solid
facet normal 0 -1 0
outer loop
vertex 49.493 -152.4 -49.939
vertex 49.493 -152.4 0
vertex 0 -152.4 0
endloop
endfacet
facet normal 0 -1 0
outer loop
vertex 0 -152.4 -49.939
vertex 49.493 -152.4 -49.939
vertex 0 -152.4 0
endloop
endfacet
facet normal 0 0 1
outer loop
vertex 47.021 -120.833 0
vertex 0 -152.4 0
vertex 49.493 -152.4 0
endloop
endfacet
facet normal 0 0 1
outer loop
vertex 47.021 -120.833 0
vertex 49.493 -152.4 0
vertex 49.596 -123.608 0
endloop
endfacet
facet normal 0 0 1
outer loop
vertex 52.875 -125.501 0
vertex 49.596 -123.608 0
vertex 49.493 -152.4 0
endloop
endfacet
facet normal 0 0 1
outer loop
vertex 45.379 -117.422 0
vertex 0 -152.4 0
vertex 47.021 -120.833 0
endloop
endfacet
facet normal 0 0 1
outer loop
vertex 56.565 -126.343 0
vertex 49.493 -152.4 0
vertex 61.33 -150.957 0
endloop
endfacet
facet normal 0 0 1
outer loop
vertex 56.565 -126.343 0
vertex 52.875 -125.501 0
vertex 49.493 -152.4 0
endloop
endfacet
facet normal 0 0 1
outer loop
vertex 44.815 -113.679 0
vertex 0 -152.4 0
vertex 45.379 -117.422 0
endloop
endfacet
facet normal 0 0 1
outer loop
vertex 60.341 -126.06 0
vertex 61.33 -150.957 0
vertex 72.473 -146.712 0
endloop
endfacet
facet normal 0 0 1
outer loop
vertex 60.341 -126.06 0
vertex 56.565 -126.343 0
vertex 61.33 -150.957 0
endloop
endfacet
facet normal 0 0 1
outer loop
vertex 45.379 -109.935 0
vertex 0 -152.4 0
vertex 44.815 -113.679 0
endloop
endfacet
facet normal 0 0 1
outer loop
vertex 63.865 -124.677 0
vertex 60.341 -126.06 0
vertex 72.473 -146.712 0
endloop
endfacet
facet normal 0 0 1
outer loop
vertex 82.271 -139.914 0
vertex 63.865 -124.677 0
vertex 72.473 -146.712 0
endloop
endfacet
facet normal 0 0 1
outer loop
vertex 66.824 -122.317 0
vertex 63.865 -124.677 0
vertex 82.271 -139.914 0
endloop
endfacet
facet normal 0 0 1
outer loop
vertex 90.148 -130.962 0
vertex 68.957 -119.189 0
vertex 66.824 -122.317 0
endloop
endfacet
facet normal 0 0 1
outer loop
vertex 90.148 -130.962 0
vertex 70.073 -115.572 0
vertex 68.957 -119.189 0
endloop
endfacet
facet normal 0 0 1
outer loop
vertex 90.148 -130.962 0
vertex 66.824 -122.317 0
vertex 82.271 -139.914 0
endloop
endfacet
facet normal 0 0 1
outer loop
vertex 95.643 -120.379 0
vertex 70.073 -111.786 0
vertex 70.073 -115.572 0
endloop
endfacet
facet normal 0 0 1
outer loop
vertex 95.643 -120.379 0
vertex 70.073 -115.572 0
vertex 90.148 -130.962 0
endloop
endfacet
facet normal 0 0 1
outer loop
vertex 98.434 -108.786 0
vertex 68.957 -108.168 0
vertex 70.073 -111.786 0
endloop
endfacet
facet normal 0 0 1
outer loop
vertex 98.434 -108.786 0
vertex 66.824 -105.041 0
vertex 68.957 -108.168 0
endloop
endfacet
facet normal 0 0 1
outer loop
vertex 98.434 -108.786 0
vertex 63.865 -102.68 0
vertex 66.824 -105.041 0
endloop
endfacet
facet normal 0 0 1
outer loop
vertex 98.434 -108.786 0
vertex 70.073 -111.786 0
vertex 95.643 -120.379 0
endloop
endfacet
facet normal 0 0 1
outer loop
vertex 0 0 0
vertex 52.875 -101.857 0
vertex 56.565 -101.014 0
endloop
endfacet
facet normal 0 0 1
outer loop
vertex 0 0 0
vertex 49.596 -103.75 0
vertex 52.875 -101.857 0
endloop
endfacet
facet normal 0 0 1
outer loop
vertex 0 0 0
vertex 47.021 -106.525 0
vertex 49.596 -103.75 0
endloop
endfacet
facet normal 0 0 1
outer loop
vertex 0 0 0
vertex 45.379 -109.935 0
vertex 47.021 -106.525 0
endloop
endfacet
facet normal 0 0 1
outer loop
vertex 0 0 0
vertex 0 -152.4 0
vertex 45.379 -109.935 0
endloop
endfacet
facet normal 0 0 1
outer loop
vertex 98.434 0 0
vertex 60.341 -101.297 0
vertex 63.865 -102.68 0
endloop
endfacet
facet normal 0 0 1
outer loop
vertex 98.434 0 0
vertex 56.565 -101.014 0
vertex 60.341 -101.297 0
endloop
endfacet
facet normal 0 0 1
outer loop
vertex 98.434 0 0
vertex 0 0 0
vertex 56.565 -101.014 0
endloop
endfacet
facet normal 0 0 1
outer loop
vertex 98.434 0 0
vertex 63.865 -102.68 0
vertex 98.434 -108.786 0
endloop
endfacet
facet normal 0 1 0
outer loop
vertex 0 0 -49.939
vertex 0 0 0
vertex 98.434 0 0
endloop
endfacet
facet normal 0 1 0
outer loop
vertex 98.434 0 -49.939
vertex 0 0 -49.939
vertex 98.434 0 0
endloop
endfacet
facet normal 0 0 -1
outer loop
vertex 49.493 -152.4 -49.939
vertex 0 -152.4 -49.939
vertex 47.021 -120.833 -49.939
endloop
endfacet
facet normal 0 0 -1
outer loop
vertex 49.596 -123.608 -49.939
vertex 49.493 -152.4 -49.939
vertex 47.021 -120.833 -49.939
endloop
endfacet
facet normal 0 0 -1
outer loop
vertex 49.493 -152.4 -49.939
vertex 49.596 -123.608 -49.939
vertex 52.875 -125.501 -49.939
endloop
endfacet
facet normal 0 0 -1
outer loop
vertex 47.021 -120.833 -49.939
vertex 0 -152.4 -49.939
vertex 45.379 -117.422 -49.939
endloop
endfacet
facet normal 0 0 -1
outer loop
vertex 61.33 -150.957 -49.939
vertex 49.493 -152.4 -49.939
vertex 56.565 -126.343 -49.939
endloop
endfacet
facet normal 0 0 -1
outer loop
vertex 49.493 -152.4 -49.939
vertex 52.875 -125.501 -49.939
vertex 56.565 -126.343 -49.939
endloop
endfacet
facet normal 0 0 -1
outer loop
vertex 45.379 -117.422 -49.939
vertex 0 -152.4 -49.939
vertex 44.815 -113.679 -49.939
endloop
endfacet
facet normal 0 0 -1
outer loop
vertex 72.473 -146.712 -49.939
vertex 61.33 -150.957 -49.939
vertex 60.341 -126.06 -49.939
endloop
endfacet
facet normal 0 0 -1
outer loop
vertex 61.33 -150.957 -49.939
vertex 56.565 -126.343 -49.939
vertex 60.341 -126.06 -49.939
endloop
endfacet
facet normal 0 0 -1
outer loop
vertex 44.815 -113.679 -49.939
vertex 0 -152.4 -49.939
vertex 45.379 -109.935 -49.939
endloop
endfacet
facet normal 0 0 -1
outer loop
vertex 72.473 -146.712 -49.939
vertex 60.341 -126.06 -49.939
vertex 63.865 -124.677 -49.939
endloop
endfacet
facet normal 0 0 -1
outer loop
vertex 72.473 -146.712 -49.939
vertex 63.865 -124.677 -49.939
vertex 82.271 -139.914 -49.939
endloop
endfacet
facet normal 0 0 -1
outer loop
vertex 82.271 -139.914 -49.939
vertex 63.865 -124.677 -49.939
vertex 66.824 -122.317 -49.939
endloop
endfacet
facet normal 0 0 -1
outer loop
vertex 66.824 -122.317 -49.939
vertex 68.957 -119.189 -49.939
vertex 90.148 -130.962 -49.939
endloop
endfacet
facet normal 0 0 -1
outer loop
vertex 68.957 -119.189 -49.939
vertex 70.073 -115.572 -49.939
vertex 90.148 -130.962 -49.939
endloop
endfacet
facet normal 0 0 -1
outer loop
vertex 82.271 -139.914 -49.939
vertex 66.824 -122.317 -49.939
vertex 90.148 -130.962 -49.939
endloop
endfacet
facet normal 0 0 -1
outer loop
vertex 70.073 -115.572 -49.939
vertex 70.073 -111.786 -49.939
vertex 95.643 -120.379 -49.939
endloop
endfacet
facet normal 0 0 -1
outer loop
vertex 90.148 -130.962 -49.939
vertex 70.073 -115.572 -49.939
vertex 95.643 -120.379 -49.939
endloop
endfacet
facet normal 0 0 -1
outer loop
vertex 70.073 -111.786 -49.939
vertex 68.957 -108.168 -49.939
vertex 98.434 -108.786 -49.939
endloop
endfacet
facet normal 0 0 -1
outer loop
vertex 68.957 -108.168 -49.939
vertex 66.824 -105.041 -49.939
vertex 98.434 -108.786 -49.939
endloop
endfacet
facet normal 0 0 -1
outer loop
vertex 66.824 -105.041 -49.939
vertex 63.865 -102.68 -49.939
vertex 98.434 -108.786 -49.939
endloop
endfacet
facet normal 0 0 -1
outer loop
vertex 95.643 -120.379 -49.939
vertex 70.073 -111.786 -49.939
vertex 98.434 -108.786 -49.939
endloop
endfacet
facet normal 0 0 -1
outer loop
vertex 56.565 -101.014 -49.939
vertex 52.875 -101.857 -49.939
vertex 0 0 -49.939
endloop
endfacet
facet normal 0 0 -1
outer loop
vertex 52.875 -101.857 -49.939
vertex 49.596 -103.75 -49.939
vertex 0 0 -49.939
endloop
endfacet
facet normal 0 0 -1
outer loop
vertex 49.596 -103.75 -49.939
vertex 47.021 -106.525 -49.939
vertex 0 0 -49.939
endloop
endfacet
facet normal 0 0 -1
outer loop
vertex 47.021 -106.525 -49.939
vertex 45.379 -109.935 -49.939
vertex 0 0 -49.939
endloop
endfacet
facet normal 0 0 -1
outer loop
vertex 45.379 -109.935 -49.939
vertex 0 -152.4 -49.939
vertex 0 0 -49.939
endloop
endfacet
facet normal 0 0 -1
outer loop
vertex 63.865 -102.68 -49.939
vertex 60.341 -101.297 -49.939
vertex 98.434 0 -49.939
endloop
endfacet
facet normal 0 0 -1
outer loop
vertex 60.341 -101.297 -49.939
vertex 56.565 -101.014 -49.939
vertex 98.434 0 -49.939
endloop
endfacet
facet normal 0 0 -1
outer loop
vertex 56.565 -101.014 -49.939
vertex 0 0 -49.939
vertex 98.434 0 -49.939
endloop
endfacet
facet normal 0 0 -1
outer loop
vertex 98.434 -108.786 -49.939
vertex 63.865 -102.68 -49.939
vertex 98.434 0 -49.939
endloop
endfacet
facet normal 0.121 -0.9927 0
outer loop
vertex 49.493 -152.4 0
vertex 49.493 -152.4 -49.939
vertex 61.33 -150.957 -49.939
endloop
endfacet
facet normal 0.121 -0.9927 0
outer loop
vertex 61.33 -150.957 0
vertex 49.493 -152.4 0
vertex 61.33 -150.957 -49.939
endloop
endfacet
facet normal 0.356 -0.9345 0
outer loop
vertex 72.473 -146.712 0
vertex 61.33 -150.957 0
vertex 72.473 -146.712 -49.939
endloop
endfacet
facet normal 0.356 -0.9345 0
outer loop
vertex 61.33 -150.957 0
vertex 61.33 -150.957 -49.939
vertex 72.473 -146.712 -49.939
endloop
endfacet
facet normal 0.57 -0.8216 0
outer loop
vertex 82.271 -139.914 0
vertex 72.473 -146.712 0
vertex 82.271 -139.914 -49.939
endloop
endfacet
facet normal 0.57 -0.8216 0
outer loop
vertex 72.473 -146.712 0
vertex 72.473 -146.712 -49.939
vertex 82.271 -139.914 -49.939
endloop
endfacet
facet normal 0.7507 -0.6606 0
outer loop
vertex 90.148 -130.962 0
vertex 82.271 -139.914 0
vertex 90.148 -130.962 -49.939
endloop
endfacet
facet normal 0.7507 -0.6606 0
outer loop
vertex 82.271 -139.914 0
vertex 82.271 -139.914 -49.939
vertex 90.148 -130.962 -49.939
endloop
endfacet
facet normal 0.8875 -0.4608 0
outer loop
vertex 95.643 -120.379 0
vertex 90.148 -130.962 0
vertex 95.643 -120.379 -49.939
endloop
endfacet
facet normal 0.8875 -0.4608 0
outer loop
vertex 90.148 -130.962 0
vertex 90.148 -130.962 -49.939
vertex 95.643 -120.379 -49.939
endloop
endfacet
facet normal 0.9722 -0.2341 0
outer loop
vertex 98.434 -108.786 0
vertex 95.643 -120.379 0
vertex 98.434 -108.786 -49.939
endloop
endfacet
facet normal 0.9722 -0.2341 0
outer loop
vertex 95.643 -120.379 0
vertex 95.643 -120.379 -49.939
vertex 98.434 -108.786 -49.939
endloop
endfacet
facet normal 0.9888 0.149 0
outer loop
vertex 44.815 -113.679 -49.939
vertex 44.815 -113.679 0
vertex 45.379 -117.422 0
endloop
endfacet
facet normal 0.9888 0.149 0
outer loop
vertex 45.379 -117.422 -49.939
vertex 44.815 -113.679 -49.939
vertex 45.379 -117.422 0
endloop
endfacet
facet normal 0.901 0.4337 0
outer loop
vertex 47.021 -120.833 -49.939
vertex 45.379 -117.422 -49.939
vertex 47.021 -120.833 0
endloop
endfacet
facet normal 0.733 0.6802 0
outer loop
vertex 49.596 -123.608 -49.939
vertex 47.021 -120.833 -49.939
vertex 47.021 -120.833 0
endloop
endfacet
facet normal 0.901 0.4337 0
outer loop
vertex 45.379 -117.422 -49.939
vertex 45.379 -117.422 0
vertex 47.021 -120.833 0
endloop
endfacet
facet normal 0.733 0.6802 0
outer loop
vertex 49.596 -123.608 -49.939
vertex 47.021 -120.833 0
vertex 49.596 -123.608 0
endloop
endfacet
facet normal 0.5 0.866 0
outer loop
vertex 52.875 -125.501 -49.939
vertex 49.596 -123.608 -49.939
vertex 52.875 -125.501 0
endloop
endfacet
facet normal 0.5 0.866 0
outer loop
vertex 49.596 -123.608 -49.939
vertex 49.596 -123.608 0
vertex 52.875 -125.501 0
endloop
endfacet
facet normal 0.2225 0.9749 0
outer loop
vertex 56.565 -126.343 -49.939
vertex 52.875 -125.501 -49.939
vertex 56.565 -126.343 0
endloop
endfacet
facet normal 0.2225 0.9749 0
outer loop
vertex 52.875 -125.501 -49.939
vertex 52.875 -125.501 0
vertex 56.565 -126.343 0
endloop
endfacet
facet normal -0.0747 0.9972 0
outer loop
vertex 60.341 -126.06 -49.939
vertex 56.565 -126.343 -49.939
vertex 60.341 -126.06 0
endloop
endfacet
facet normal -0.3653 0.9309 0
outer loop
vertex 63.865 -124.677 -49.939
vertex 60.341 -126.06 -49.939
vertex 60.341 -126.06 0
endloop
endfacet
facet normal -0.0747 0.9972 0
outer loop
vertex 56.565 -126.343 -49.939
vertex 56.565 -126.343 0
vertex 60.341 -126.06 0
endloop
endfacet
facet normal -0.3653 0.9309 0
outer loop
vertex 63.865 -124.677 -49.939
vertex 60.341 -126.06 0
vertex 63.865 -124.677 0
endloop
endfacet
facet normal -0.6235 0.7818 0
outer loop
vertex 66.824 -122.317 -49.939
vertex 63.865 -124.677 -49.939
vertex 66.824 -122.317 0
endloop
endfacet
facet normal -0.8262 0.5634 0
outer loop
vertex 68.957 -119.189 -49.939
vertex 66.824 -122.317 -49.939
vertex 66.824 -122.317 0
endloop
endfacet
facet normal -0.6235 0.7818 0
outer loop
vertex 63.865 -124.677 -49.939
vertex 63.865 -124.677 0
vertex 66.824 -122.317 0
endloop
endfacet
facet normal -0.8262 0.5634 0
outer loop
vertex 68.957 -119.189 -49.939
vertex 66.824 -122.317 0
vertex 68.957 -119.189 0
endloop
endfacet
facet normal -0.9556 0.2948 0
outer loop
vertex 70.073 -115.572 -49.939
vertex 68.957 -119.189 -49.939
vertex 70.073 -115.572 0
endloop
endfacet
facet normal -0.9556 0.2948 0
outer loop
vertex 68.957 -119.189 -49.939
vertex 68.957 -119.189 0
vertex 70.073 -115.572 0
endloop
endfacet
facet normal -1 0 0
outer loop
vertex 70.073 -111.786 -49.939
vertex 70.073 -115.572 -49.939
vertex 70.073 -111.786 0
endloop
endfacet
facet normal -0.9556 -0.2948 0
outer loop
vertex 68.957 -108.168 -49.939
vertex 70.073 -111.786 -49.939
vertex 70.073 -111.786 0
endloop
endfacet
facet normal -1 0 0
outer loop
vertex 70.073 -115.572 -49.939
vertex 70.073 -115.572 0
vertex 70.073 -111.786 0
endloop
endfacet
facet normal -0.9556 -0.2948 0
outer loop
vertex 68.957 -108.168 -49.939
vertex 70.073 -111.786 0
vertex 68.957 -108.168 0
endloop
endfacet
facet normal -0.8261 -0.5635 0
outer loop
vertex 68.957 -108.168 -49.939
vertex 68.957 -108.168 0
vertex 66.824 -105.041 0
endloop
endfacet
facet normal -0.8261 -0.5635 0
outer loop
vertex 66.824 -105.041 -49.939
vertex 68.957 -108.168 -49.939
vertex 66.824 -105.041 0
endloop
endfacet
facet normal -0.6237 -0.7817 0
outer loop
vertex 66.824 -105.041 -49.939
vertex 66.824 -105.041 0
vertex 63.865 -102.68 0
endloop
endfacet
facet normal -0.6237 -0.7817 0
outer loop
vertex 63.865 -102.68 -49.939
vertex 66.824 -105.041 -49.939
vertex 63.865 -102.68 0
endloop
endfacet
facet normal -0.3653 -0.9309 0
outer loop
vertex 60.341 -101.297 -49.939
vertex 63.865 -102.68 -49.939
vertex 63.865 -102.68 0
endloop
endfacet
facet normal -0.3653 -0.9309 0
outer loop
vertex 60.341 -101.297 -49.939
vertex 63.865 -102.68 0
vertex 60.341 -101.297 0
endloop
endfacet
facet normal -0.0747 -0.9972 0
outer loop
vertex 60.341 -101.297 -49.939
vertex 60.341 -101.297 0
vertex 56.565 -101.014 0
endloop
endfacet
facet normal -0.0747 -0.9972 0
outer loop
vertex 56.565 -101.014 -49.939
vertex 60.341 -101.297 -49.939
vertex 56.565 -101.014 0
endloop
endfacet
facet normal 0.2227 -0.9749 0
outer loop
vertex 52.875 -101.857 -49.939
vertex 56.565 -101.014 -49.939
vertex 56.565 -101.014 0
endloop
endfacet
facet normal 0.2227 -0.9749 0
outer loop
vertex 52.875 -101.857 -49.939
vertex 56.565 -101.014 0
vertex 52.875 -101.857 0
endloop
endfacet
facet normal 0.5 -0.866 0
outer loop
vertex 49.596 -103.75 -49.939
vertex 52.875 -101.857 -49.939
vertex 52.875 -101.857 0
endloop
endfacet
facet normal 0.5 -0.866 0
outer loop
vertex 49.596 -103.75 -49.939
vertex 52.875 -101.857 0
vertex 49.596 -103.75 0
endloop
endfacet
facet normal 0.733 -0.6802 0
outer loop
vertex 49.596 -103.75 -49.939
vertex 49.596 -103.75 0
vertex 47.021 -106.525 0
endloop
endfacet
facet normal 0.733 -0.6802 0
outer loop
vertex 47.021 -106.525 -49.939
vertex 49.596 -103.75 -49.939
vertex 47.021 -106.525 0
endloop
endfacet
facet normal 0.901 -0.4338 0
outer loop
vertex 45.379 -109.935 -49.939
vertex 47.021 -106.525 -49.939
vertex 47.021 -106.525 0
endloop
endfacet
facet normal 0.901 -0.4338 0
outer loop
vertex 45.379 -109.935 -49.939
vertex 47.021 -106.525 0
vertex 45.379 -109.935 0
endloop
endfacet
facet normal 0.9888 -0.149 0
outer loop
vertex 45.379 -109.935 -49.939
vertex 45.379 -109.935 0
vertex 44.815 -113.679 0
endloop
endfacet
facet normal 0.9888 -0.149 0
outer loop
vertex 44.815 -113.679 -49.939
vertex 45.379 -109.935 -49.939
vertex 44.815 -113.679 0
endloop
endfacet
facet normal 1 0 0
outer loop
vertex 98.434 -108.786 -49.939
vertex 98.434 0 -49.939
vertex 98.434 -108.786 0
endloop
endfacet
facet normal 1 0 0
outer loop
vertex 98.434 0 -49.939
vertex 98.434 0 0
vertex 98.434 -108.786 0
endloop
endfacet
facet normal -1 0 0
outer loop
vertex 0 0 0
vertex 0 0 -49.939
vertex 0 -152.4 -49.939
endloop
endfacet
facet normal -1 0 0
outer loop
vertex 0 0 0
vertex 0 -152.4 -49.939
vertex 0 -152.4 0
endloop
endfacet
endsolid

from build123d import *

# Parameters (mm, degrees)
F0_W     = 98.4343141317
F0_H     = 49.9388501048
F1_DEPTH = 152.4
F3_DEPTH = 25.4
F4_DEPTH = 101.6
F6_D     = 25.4


with BuildPart() as f1:
    # F0 (on Front) → F1 (new body)
    with BuildSketch(Plane.XZ):
        with Locations((49.2171570659, -24.9694250524)):
            Rectangle(F0_W, F0_H)
    extrude(amount=F1_DEPTH)

    # F2 (on face) → F3 (join)
    with BuildSketch(Plane(origin=(0, 0, -49.9388501048), x_dir=(1, 0, 0), z_dir=(0, 0, -1))):
        with BuildLine():
            ThreePointArc((49.4931302965, 152.4), (82.2706467442, 139.9142220829), (98.4343141317, 108.7855200338))
            Line((98.4343141317, 108.7855200338), (98.4343141317, 152.4))
            Line((98.4343141317, 152.4), (49.4931302965, 152.4))
        make_face()
    extrude(amount=F3_DEPTH)

    # F4 (cut): a face of the model
    f4_faces = [f1.faces().sort_by_distance(p)[0] for p in [
        (87.4379245135, -141.7394263284, -75.3388501048),
    ]]
    extrude(f4_faces, amount=-F4_DEPTH, mode=Mode.SUBTRACT)

    # F6 (through all)
    with Locations(Plane(origin=(0, 0, -49.9388501048), x_dir=(1, 0, 0), z_dir=(0, 0, -1))):
        with Locations((57.5145594776, 113.6788129807)):
            Hole(F6_D / 2)


solid = f1.part
